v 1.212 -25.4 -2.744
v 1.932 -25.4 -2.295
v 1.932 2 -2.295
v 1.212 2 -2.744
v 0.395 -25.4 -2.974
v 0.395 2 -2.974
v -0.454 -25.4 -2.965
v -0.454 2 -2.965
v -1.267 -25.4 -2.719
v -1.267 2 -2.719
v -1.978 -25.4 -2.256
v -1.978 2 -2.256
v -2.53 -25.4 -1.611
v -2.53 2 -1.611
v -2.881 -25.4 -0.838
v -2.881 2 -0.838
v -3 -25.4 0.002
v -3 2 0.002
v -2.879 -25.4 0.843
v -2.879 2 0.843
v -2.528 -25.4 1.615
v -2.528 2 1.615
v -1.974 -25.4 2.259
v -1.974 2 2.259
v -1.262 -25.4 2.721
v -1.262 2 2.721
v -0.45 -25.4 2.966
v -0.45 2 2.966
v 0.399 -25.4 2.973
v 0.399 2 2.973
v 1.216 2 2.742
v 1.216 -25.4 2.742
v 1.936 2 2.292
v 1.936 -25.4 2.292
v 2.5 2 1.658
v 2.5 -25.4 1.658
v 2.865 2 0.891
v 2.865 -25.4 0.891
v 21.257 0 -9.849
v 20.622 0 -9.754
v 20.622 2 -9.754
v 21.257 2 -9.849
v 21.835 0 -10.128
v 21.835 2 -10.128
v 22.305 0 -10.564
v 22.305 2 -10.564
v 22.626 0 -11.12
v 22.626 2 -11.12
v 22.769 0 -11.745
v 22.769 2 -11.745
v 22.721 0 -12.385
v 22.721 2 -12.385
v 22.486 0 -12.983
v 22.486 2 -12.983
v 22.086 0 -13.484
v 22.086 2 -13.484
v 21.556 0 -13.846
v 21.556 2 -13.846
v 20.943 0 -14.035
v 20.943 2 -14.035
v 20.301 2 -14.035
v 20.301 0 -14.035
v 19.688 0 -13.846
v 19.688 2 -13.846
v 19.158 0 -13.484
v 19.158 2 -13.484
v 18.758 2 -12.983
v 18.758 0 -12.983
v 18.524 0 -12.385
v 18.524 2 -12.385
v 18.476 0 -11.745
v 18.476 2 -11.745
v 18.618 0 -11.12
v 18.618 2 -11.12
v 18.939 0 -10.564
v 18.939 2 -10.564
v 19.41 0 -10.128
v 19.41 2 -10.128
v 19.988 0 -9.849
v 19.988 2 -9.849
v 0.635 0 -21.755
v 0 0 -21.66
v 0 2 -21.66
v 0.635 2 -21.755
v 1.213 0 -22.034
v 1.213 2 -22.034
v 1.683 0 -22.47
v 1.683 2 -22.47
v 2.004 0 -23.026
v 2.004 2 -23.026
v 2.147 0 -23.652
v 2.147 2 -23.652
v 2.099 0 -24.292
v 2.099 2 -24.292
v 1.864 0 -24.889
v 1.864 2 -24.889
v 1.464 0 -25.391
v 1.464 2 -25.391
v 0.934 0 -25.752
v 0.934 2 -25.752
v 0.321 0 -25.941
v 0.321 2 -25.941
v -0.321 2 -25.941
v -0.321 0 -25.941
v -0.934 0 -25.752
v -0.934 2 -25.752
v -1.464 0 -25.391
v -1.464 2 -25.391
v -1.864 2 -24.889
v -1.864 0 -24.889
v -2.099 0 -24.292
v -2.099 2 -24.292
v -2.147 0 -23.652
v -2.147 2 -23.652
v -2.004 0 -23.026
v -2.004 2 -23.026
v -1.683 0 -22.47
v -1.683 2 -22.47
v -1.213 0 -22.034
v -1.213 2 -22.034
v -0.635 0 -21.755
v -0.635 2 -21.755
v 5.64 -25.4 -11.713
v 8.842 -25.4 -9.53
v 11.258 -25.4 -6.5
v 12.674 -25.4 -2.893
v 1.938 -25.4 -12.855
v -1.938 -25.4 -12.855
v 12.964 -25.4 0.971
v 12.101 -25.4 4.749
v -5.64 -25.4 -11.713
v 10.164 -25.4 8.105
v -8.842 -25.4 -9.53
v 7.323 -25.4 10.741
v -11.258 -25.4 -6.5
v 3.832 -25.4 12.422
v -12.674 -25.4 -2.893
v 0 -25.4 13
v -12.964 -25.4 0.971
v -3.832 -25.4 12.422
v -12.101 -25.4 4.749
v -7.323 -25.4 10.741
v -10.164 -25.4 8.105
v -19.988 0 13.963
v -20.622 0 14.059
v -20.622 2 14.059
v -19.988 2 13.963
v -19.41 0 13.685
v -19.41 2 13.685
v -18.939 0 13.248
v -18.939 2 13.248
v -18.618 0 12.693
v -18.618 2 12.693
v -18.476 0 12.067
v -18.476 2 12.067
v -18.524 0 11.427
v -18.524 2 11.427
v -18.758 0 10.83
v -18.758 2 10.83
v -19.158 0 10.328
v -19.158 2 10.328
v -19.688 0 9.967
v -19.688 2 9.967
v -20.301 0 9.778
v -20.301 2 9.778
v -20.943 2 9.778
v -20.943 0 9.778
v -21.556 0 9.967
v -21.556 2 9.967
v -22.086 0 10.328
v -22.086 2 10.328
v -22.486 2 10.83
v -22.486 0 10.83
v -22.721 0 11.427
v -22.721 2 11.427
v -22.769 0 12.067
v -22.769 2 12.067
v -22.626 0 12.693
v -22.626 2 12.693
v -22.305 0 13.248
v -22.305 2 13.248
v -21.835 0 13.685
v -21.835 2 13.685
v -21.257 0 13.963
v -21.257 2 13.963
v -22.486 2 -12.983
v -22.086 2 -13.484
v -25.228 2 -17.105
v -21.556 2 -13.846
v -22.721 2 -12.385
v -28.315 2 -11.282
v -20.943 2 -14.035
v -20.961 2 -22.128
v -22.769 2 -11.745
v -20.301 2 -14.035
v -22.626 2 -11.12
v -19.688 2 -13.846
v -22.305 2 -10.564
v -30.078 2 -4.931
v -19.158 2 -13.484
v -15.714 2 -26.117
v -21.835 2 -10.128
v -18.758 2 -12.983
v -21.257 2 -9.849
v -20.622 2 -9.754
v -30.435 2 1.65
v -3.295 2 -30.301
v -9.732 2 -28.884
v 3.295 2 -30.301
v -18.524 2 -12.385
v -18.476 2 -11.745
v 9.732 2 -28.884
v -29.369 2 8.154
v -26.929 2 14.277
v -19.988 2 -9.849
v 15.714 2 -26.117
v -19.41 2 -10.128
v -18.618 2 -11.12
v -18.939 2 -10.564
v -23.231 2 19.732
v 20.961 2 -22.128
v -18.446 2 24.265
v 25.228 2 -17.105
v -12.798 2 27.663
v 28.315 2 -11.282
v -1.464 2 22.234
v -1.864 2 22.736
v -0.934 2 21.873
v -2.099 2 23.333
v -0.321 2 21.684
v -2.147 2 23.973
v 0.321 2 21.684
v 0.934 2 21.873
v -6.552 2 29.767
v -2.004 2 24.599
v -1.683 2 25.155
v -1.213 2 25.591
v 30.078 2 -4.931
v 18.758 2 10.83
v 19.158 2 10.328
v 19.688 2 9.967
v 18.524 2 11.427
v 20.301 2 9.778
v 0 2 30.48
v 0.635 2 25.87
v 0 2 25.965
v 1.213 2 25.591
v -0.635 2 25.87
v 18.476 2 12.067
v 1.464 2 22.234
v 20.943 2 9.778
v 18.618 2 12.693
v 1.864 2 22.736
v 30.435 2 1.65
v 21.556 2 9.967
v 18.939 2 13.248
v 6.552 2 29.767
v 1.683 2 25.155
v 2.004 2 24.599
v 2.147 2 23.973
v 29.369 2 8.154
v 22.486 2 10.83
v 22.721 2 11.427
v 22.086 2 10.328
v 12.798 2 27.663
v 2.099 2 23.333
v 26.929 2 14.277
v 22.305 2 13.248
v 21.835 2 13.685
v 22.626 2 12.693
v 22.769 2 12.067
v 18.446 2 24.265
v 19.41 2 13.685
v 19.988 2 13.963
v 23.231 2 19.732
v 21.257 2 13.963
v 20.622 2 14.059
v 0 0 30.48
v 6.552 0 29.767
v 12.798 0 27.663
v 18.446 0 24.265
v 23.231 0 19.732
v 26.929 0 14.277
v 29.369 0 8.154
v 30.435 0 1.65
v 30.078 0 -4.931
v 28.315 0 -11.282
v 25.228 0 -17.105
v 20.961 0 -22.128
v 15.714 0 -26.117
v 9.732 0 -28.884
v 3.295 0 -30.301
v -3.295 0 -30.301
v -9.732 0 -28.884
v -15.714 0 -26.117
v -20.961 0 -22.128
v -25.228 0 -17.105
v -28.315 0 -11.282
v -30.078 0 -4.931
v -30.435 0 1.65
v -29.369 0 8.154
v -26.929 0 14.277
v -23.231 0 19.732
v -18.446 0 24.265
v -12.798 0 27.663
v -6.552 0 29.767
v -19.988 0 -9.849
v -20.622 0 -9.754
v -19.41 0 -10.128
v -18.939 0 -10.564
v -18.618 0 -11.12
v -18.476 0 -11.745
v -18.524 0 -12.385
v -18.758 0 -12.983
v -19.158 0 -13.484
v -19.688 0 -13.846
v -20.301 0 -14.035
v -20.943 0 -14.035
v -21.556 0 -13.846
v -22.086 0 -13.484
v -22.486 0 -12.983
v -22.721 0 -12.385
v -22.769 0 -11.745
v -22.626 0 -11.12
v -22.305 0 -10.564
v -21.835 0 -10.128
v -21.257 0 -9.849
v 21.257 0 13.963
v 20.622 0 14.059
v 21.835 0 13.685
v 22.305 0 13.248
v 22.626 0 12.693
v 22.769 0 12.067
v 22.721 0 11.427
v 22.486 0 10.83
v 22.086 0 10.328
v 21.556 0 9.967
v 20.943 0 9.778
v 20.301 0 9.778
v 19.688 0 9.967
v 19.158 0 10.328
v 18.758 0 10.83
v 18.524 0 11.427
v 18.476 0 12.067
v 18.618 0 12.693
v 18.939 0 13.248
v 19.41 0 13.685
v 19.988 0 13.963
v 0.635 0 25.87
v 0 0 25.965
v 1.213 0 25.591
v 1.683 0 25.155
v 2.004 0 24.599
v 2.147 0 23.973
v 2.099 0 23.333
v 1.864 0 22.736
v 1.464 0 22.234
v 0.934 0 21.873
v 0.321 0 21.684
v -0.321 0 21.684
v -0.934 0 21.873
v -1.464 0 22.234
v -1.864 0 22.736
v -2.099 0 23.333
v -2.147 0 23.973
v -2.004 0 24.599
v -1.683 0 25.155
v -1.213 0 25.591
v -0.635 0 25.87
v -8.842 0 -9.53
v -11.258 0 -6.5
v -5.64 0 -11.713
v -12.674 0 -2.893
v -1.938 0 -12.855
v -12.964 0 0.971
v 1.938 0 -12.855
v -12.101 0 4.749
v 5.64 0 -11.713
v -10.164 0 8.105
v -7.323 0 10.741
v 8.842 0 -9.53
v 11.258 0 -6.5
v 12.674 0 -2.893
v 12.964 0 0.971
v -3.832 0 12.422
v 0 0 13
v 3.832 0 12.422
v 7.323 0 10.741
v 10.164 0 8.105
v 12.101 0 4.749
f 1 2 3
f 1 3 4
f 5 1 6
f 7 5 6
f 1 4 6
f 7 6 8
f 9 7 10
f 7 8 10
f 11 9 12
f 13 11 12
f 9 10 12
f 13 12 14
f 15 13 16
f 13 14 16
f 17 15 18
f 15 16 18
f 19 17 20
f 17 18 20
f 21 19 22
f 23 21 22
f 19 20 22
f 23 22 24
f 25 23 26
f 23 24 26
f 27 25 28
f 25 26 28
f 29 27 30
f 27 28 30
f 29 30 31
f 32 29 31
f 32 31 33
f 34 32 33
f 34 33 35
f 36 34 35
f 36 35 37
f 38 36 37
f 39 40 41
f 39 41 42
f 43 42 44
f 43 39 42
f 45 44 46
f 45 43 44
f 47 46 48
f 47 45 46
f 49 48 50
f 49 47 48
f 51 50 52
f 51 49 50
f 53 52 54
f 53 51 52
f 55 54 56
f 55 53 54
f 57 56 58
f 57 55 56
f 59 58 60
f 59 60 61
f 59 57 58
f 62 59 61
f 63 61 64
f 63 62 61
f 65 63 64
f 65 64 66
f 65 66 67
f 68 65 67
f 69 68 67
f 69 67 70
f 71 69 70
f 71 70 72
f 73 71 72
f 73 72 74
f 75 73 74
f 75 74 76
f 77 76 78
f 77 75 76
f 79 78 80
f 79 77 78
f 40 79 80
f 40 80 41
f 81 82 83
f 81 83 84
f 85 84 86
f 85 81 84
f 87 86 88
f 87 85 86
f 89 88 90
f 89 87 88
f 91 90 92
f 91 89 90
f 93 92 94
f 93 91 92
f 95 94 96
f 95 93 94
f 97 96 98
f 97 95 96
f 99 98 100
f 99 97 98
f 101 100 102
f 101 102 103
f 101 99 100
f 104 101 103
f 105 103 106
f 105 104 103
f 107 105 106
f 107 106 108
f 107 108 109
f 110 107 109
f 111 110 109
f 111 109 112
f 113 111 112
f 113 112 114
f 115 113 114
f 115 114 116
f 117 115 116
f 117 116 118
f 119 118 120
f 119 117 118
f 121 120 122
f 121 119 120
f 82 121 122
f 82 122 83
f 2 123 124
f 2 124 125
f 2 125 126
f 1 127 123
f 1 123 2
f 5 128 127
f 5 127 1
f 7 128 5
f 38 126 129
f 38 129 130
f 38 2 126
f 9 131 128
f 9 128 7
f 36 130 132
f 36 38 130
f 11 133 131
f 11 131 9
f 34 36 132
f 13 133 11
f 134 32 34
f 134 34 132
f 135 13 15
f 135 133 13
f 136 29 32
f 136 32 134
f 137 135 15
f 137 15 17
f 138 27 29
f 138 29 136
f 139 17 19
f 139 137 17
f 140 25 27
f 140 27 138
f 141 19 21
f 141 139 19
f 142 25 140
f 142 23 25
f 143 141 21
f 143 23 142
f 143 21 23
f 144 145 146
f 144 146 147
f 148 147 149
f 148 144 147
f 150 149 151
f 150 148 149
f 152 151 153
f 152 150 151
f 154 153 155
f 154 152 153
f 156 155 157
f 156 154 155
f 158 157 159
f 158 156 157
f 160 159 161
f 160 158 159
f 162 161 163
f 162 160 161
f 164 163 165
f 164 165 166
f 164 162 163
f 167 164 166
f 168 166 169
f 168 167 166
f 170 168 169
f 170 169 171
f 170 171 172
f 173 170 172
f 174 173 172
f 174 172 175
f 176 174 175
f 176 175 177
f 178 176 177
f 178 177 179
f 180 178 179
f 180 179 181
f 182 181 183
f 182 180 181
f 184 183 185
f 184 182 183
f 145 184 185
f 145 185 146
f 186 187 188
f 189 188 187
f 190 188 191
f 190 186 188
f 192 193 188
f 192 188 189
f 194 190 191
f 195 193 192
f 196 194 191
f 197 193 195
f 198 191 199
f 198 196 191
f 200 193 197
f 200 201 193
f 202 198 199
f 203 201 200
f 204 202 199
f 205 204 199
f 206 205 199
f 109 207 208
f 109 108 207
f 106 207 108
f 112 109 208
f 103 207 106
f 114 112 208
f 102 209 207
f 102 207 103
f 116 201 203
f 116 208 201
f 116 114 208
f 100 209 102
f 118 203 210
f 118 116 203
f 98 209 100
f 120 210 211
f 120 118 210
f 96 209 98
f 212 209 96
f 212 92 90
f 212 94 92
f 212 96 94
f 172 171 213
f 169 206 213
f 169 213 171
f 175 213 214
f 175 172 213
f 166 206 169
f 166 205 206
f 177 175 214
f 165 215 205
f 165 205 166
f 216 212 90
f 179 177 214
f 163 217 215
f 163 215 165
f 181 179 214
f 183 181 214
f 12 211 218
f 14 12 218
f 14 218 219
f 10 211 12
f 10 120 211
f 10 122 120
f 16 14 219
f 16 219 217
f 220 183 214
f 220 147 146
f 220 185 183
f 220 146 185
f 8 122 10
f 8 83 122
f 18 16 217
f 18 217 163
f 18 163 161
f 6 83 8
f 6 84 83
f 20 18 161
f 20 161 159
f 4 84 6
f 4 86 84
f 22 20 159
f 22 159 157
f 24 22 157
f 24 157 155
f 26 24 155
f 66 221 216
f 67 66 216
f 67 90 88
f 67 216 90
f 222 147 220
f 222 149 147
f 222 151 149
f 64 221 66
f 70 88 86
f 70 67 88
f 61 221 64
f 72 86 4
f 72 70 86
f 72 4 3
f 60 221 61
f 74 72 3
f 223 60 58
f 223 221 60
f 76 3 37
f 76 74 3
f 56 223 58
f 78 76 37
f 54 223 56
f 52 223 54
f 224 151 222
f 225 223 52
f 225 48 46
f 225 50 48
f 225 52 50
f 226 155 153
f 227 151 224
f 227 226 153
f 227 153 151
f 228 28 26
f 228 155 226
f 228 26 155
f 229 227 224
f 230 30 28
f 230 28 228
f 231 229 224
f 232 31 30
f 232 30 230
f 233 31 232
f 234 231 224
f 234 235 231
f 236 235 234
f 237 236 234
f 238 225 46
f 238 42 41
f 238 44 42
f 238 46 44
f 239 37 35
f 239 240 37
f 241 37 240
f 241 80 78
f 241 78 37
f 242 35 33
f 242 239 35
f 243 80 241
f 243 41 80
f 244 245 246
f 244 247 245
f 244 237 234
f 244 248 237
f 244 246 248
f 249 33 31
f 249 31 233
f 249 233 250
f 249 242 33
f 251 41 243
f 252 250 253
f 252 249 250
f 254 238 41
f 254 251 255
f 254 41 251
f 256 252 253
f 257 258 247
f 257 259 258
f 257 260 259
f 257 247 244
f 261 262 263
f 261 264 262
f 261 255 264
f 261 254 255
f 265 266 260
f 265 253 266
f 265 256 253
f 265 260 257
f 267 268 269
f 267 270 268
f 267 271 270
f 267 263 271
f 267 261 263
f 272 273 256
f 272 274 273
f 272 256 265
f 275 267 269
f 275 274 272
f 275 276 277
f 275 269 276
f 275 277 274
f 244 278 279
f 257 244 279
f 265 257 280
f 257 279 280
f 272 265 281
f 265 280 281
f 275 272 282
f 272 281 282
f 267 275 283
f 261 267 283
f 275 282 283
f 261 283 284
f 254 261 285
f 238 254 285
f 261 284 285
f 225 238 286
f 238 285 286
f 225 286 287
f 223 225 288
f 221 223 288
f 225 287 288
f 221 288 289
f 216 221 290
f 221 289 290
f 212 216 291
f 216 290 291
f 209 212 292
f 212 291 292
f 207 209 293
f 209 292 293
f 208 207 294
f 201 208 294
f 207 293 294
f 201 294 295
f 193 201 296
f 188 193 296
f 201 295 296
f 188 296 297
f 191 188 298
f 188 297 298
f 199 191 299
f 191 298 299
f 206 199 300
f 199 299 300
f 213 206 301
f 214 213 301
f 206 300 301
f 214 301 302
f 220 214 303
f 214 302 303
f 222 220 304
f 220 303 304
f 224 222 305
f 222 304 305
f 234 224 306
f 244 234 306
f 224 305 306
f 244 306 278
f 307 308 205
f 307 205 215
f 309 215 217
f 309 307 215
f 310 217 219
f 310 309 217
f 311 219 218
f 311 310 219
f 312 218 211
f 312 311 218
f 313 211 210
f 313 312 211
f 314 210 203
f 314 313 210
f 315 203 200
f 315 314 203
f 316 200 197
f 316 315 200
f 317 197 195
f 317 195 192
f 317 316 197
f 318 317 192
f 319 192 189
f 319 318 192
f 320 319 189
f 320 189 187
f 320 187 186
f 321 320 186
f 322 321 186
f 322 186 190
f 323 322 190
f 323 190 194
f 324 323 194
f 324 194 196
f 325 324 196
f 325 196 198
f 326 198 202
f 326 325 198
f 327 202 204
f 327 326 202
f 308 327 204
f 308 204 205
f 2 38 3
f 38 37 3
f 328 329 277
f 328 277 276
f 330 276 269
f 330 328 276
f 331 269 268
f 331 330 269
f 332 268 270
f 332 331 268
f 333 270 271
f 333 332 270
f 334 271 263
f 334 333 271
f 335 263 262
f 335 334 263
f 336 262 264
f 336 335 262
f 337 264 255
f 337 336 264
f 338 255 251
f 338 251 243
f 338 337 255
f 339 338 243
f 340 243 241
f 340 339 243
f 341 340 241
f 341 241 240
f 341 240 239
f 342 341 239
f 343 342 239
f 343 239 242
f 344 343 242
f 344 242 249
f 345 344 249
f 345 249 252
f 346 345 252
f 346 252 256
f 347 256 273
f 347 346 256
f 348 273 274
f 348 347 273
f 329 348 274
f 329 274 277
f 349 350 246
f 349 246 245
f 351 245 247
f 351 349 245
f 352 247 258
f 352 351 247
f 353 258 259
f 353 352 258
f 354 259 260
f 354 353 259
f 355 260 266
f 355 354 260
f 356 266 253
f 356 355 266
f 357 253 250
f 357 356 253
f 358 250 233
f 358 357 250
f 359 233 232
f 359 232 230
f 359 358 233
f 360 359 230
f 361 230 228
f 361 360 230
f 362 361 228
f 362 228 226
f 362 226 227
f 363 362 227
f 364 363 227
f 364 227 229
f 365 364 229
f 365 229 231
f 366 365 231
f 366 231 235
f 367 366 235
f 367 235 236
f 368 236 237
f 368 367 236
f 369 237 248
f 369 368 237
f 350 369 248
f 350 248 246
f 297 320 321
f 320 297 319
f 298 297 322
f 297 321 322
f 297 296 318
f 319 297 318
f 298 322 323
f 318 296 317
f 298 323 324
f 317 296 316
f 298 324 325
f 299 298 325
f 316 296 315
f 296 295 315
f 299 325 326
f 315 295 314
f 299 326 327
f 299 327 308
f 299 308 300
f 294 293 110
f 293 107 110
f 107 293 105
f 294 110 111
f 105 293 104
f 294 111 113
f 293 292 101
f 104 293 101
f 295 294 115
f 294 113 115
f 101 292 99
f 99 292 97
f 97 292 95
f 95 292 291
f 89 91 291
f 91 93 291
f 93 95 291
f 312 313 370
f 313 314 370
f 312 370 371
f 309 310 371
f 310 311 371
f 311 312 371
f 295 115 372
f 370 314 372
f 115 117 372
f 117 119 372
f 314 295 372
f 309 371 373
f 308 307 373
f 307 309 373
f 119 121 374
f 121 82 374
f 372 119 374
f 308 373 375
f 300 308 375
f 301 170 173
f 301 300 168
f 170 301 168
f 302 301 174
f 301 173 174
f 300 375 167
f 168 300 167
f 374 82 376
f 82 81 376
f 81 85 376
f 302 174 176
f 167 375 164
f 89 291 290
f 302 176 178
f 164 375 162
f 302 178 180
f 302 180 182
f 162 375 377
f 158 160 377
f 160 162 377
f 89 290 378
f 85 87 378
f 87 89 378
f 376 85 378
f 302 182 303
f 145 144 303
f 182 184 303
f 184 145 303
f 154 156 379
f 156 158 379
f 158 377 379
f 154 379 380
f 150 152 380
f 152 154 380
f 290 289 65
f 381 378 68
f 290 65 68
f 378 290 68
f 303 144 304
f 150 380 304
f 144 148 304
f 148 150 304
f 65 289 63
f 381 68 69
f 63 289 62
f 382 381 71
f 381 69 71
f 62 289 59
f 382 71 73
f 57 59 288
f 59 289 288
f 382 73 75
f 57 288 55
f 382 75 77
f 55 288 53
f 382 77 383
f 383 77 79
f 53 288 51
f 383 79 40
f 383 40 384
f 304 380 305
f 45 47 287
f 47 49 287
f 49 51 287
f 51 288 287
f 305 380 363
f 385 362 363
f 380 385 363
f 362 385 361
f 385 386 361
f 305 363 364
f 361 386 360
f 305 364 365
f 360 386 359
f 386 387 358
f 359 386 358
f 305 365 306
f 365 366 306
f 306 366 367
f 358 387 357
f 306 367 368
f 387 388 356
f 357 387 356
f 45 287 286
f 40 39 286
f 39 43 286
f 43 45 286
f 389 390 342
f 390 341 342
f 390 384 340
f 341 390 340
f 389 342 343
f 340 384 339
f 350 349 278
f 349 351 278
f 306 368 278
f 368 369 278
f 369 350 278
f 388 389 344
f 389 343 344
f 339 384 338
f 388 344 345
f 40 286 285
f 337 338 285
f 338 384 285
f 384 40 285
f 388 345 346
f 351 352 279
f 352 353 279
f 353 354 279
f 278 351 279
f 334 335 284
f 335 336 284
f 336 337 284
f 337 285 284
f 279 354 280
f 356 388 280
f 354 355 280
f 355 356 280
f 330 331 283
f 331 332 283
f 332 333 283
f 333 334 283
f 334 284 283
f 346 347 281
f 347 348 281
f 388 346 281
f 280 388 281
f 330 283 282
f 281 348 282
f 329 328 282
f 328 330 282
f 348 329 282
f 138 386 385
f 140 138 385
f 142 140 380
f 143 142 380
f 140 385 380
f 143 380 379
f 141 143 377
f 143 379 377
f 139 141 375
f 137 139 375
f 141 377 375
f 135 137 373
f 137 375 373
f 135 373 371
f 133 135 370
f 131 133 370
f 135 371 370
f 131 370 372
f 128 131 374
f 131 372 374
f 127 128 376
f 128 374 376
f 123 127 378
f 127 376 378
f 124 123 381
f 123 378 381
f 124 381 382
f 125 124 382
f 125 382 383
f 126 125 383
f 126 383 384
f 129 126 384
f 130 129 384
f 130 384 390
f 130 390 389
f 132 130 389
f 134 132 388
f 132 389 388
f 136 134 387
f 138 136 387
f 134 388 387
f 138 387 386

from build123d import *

# Parameters (mm, degrees)
SKETCH1_R           = 30.48
SKETCH1_R_2         = 2.15265
BOSS_EXTRUDE1_DEPTH = 2
CUT_EXTRUDE1_DEPTH  = 10
SKETCH3_R           = 13
SKETCH3_R_2         = 3.110414615
BOSS_EXTRUDE2_DEPTH = 25.4


with BuildPart() as part:
    # Sketch1 → Boss-Extrude1 (new body)
    with BuildSketch(Plane(origin=(0, 0, 0), x_dir=(1, 0, 0), z_dir=(0, 1, 0))):
        with Locations(Location((0, 0, 0), (0, 0, 270))):
            Circle(SKETCH1_R)
        with Locations(Location((0, -23.8125, 0), (0, 0, 270))):
            Circle(SKETCH1_R_2, mode=Mode.SUBTRACT)
        with Locations(Location((20.622229928, -11.90625, 0), (0, 0, 270))):
            Circle(SKETCH1_R_2, mode=Mode.SUBTRACT)
        with Locations(Location((20.622229928, 11.90625, 0), (0, 0, 270))):
            Circle(SKETCH1_R_2, mode=Mode.SUBTRACT)
        with Locations(Location((0, 23.8125, 0), (0, 0, 270))):
            Circle(SKETCH1_R_2, mode=Mode.SUBTRACT)
        with Locations(Location((-20.622229928, 11.90625, 0), (0, 0, 270))):
            Circle(SKETCH1_R_2, mode=Mode.SUBTRACT)
        with Locations(Location((-20.622229928, -11.90625, 0), (0, 0, 270))):
            Circle(SKETCH1_R_2, mode=Mode.SUBTRACT)
    extrude(amount=BOSS_EXTRUDE1_DEPTH)

    # Sketch2 → Cut-Extrude1 (cut)
    with BuildSketch(Plane(origin=(0, 2, 0), x_dir=(1, 0, 0), z_dir=(0, 1, 0))):
        with BuildLine():
            ThreePointArc((1.93204455, 2.295038966), (-2.879237228, -0.842610814), (2.864533851, -0.8913169))
            Line((2.864533851, -0.8913169), (1.93204455, 2.295038966))
        make_face()
    extrude(amount=-CUT_EXTRUDE1_DEPTH, mode=Mode.SUBTRACT)

    # Sketch3 → Boss-Extrude2 (add)
    # profile 1 of 2: a face of its own
    with BuildSketch(Plane.XZ):
        with Locations(Location((0, 0, 0), (0, 0, 90))):
            Circle(SKETCH3_R)
        Circle(SKETCH3_R_2, mode=Mode.SUBTRACT)
    # profile 2 of 2: a face of its own
    with BuildSketch(Plane.XZ):
        Circle(SKETCH3_R_2)
        with BuildLine():
            Line((2.864533851, 0.8913169), (1.93204455, -2.295038966))
            ThreePointArc((1.93204455, -2.295038966), (-2.879237228, 0.842610814), (2.864533851, 0.8913169))
        make_face(mode=Mode.SUBTRACT)
    extrude(amount=BOSS_EXTRUDE2_DEPTH)


solid = part.part
